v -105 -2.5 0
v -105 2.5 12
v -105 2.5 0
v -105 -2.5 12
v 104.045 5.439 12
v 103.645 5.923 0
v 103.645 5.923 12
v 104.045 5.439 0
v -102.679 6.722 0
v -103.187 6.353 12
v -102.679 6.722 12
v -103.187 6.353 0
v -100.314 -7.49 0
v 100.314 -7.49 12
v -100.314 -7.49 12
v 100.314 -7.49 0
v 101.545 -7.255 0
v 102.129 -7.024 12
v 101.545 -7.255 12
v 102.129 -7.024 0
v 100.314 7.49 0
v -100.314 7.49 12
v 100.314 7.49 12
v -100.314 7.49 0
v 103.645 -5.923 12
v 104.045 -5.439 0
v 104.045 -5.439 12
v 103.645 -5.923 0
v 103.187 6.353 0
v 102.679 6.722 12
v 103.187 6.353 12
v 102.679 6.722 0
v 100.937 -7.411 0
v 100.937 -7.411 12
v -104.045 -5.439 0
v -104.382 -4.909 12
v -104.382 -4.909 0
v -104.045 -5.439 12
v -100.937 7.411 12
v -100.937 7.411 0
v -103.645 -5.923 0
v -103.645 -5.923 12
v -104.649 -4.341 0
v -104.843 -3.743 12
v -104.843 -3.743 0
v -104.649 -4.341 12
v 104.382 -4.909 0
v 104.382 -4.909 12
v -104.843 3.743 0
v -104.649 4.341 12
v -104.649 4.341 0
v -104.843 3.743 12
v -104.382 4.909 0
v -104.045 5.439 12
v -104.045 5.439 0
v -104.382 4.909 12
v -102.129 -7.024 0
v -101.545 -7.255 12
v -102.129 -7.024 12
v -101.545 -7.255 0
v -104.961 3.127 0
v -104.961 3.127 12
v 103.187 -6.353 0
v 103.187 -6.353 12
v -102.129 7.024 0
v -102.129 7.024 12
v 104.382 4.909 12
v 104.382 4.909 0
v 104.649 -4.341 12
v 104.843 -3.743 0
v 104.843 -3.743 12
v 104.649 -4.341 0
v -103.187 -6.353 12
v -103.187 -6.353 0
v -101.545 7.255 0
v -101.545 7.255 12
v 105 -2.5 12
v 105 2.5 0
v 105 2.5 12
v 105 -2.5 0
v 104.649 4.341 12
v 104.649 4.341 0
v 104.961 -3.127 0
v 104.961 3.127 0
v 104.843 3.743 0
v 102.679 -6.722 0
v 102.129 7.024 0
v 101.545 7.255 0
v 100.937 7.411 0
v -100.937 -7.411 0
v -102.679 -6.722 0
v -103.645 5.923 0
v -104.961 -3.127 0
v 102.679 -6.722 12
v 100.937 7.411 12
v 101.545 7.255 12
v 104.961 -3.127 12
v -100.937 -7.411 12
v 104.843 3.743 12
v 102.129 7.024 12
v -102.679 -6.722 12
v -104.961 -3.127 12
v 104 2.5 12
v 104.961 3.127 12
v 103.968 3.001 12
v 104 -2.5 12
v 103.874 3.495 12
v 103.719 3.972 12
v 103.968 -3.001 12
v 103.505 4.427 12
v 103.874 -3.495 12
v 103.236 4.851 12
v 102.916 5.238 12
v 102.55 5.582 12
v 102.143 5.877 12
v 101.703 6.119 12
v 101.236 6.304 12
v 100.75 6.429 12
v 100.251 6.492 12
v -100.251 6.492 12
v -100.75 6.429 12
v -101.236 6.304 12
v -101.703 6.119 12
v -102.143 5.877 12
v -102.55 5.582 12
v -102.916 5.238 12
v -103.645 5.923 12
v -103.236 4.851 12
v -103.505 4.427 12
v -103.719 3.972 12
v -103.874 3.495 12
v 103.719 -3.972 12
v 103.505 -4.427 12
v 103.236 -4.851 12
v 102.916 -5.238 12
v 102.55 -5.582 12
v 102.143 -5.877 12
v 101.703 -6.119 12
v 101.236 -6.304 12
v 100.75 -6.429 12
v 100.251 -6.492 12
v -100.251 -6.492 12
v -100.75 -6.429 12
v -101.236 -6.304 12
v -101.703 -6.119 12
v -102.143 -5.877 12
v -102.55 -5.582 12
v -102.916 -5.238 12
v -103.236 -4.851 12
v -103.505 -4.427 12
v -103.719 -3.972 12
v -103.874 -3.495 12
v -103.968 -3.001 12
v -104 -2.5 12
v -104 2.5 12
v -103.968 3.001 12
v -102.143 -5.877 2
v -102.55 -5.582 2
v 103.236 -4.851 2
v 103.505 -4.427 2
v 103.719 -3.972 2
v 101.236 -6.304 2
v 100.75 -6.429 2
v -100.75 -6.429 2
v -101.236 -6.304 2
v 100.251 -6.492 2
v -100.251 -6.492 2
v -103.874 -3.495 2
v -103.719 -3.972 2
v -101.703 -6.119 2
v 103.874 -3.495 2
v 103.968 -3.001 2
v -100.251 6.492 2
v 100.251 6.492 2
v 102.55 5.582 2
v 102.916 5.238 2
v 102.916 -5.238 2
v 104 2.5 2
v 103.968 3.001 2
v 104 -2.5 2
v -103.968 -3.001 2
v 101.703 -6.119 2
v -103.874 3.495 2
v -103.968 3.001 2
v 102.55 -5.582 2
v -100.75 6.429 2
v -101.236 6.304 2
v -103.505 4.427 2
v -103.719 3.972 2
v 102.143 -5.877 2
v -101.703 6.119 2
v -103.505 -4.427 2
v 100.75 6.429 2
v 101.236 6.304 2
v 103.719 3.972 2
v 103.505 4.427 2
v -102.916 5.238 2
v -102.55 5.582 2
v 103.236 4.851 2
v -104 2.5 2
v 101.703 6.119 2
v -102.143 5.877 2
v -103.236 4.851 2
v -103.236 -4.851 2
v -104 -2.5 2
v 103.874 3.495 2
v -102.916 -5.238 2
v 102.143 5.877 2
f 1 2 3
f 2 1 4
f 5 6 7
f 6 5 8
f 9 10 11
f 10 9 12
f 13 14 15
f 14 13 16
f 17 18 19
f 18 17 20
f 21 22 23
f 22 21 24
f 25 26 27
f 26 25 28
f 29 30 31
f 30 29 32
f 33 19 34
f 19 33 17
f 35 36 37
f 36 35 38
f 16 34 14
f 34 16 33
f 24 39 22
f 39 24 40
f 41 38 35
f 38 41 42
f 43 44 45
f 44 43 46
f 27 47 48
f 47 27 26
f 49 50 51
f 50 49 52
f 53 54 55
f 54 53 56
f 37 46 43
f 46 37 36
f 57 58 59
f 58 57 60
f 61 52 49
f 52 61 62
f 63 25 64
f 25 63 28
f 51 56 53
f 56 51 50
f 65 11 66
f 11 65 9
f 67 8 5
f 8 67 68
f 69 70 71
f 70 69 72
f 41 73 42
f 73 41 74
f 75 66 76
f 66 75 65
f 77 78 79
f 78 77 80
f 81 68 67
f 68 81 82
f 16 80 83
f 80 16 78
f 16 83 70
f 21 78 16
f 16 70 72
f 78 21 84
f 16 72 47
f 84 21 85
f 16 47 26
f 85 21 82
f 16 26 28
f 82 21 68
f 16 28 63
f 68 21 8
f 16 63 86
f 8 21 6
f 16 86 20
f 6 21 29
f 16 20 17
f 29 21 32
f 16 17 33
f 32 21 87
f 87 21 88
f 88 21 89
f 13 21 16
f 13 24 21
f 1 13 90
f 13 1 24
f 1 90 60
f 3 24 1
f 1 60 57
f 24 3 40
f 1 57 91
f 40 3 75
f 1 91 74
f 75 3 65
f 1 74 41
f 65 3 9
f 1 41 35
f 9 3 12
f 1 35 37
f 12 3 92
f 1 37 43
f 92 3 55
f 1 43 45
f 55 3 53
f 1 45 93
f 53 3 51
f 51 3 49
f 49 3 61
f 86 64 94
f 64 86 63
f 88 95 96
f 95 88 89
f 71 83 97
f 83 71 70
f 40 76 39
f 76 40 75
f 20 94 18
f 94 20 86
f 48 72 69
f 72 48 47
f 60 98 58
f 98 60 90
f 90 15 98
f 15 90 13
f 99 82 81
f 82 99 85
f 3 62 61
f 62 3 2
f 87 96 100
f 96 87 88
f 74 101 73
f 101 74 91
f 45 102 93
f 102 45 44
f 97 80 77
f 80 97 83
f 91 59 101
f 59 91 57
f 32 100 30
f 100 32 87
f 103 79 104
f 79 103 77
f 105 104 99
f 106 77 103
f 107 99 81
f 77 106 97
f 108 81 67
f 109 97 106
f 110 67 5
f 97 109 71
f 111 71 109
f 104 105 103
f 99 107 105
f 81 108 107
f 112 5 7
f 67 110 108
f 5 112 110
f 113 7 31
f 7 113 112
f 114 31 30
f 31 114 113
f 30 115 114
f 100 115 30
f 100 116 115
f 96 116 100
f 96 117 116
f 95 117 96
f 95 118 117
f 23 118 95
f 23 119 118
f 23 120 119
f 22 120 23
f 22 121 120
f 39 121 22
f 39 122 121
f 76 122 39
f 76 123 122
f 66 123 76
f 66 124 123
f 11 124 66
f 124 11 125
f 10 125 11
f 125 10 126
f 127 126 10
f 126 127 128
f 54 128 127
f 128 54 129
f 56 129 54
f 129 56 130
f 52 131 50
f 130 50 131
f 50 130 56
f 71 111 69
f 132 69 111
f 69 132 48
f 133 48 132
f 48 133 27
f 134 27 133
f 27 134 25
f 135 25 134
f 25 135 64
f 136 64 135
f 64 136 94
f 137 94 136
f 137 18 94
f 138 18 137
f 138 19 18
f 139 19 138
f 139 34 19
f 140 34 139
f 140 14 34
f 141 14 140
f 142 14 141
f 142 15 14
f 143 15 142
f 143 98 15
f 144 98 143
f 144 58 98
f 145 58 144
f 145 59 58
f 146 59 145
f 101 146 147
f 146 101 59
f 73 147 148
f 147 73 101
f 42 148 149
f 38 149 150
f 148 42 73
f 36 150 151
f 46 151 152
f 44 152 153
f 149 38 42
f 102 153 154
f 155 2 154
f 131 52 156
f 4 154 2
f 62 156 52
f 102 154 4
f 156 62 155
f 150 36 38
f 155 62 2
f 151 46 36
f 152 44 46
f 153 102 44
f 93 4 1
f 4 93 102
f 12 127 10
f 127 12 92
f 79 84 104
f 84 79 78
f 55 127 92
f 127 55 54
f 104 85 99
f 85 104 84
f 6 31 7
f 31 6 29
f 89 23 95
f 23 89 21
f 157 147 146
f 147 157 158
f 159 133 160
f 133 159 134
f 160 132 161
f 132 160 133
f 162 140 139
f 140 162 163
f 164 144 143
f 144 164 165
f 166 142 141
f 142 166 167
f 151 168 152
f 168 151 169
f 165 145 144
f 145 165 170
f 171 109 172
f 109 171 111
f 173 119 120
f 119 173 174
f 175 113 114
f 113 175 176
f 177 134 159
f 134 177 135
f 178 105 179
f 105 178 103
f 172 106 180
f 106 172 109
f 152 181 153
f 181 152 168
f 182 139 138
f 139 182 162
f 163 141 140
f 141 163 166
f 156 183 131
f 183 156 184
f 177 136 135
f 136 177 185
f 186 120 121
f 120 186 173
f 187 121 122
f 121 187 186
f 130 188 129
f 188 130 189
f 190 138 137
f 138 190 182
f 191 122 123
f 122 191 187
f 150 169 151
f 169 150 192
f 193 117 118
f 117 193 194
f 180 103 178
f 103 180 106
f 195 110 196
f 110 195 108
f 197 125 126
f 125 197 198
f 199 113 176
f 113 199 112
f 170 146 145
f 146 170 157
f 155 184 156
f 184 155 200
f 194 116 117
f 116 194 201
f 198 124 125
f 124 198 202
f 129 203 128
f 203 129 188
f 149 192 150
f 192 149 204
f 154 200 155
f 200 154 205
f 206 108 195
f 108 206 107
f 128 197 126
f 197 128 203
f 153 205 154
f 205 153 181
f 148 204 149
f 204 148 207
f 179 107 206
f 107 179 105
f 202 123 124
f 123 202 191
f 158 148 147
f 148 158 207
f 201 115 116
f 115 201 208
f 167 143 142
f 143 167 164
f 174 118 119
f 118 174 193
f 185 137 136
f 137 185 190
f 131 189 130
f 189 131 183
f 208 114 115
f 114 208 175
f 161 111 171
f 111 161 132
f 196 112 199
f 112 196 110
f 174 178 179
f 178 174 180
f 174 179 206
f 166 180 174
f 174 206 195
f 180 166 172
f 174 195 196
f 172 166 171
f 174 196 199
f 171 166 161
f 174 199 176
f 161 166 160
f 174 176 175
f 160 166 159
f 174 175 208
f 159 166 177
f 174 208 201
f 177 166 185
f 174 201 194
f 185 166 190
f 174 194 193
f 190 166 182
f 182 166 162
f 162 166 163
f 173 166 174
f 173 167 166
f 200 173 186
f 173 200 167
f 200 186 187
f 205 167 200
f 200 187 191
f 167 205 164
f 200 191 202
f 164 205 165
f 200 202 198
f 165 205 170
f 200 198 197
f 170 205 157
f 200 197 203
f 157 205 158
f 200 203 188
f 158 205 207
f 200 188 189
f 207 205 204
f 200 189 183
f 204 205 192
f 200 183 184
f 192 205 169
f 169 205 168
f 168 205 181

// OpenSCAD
$fn = 50;


difference() {
	union() {
		hull() {
			translate(v = [-100.0000000000, 2.5000000000, 0]) {
				cylinder(h = 12, r = 5);
			}
			translate(v = [100.0000000000, 2.5000000000, 0]) {
				cylinder(h = 12, r = 5);
			}
			translate(v = [-100.0000000000, -2.5000000000, 0]) {
				cylinder(h = 12, r = 5);
			}
			translate(v = [100.0000000000, -2.5000000000, 0]) {
				cylinder(h = 12, r = 5);
			}
		}
	}
	union() {
		translate(v = [0, 0, 2]) {
			hull() {
				translate(v = [-100.0000000000, 2.5000000000, 0]) {
					cylinder(h = 10, r = 4);
				}
				translate(v = [100.0000000000, 2.5000000000, 0]) {
					cylinder(h = 10, r = 4);
				}
				translate(v = [-100.0000000000, -2.5000000000, 0]) {
					cylinder(h = 10, r = 4);
				}
				translate(v = [100.0000000000, -2.5000000000, 0]) {
					cylinder(h = 10, r = 4);
				}
			}
		}
	}
}
